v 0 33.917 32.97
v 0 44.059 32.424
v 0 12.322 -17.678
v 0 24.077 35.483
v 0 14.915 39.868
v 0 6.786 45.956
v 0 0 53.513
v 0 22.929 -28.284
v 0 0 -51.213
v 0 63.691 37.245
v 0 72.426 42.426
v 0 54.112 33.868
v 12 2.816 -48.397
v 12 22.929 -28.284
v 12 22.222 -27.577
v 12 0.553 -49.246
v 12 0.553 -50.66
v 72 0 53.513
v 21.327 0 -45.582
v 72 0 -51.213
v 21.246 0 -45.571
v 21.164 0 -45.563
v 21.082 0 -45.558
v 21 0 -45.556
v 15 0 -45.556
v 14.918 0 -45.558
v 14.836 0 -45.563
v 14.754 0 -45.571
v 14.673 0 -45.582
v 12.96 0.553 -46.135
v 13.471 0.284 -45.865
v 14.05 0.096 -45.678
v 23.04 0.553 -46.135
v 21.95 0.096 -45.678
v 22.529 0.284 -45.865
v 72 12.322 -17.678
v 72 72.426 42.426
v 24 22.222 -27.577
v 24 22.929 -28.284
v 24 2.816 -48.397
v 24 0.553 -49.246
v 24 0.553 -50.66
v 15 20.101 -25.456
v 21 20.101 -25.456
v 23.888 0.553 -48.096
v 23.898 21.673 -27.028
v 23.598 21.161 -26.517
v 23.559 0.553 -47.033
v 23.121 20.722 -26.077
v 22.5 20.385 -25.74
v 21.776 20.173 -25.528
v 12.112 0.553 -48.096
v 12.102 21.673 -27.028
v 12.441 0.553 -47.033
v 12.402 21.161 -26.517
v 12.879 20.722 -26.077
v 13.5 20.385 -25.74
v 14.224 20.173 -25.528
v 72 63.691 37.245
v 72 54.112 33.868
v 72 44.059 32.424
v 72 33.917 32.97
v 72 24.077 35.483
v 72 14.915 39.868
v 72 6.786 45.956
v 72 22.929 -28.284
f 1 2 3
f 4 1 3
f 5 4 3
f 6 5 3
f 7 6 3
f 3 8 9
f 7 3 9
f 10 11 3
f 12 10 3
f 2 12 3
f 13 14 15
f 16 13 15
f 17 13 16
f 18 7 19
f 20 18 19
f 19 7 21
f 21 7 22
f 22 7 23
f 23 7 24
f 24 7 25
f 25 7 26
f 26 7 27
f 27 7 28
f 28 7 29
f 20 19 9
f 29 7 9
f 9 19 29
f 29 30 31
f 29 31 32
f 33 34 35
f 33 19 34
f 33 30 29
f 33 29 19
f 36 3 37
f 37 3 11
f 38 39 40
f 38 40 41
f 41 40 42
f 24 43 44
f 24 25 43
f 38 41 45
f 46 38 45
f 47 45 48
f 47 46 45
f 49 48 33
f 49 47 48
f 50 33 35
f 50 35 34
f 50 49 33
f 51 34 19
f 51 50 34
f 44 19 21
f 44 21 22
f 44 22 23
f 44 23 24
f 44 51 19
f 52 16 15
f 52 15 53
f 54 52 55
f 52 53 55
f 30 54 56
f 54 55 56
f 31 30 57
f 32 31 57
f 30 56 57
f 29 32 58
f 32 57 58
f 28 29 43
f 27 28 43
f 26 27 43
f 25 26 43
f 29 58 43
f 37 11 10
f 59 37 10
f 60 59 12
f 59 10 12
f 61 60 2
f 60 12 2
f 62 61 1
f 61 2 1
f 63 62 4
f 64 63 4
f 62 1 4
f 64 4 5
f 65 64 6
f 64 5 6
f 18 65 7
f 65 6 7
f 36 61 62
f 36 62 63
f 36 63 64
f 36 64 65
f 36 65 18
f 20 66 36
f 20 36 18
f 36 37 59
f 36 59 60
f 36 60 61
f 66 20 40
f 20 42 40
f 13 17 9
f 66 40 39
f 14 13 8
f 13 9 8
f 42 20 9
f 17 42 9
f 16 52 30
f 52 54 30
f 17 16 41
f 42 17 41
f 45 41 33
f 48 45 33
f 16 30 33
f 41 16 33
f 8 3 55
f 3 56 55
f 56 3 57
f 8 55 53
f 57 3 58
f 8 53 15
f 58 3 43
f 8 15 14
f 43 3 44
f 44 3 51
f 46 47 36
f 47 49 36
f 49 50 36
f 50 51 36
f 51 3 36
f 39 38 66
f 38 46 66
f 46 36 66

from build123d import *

# Parameters (mm, degrees)
BOSS_EXTRUDE2_DEPTH = 72
SKETCH3_W           = 12
SKETCH3_H           = 40
CUT_EXTRUDE1_DEPTH  = 4
CUT_EXTRUDE2_DEPTH  = 116.296301893
SKETCH5_W           = 12
SKETCH5_H           = 13.444323502
CUT_EXTRUDE3_DEPTH  = 4
CHAMFER1_SIZE       = 3.2
FILLET1_R           = 3


with BuildPart() as part:
    # Sketch2 → Boss-Extrude2 (new body)
    with BuildSketch(Plane(origin=(0, 0, 0), x_dir=(0, 0, -1), z_dir=(1, 0, 0))):
        with BuildLine():
            Line((10.606601718, 40.606601718), (0, 30))
            Line((0, 30), (-42.426406871, 72.426406871))
            ThreePointArc((-42.426406871, 72.426406871), (-32.969757857, 33.917072276), (-53.513108843, 0))
            Line((-53.513108843, 0), (0, 0))
            Line((0, 0), (30, 0))
            Line((30, 0), (51.213203436, 0))
            Line((51.213203436, 0), (10.606601718, 40.606601718))
        make_face()
    extrude(amount=BOSS_EXTRUDE2_DEPTH)

    # Sketch3 → Cut-Extrude1 (cut)
    with BuildSketch(Plane(origin=(0, 25.606601718, -25.606601718), x_dir=(1, 0, 0), z_dir=(0, 0.7071067811865561, -0.7071067811865389))):
        with Locations((18, -1.213203436)):
            Rectangle(SKETCH3_W, SKETCH3_H)
    extrude(amount=-CUT_EXTRUDE1_DEPTH, mode=Mode.SUBTRACT)

    # Sketch4 → Cut-Extrude2 (cut, through all)
    with BuildSketch(Plane(origin=(72, 0, 0), x_dir=(0, 0, -1), z_dir=(1, 0, 0))):
        Polygon((0, 30), (17.67766953, 12.32233047), (28.284271247, 22.928932188), (10.606601718, 40.606601718), align=None)
    extrude(amount=-CUT_EXTRUDE2_DEPTH, mode=Mode.SUBTRACT)

    # Sketch5 → Cut-Extrude3 (cut)
    with BuildSketch(Plane(origin=(0, 25.606601718, -25.606601718), x_dir=(1, 0, 0), z_dir=(0, 0.7071067811865561, -0.7071067811865389))):
        with Locations((18, 25.508958315)):
            Rectangle(SKETCH5_W, SKETCH5_H)
    extrude(amount=-CUT_EXTRUDE3_DEPTH, mode=Mode.SUBTRACT)

    # Chamfer1
    chamfer1_edges = [part.edges().sort_by_distance(p)[0] for p in [
        (18, 2.815758154, -48.397445281),
    ]]
    chamfer(chamfer1_edges, length=CHAMFER1_SIZE)

    # Fillet1
    fillet1_edges = [part.edges().sort_by_distance(p)[0] for p in [
        (24, 10.050252532, -35.506096654),
        (12, 10.050252532, -35.506096654),
    ]]
    fillet(fillet1_edges, radius=FILLET1_R)


solid = part.part
